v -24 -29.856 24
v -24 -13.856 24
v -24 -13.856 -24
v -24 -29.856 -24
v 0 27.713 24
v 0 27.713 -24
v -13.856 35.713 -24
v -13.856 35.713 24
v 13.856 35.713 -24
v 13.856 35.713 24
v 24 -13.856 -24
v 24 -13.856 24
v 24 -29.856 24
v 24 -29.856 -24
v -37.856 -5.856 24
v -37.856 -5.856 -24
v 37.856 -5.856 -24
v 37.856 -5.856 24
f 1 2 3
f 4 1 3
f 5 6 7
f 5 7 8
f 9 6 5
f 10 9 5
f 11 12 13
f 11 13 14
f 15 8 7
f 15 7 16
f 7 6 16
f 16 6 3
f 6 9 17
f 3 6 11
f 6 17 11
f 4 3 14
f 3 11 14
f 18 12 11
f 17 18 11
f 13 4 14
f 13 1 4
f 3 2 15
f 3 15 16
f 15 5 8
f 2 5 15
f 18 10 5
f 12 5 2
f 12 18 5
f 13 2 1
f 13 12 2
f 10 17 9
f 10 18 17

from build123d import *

# Parameters (mm, degrees)
F1_DEPTH = 24
F2_DEPTH = 16
F3_DEPTH = 16
F4_DEPTH = 16


with BuildPart() as f1:
    # F0 (on Top) → F1 (new body, symmetric)
    with BuildSketch(Plane.XY):
        Polygon((24, -13.8564064606), (0, 27.7128129211), (-24, -13.8564064606), align=None)
    extrude(amount=F1_DEPTH, both=True)

    # F2 (add): a face of the model
    f2_faces = [f1.faces().sort_by_distance(p)[0] for p in [
        (0, -13.8564064606, 0),
    ]]
    extrude(f2_faces, amount=F2_DEPTH)

    # F3 (add): a face of the model
    f3_faces = [f1.faces().sort_by_distance(p)[0] for p in [
        (12, 6.9282032303, 0),
    ]]
    extrude(f3_faces, amount=F3_DEPTH)

    # F4 (add): a face of the model
    f4_faces = [f1.faces().sort_by_distance(p)[0] for p in [
        (-12, 6.9282032303, 0),
    ]]
    extrude(f4_faces, amount=F4_DEPTH)


solid = f1.part
